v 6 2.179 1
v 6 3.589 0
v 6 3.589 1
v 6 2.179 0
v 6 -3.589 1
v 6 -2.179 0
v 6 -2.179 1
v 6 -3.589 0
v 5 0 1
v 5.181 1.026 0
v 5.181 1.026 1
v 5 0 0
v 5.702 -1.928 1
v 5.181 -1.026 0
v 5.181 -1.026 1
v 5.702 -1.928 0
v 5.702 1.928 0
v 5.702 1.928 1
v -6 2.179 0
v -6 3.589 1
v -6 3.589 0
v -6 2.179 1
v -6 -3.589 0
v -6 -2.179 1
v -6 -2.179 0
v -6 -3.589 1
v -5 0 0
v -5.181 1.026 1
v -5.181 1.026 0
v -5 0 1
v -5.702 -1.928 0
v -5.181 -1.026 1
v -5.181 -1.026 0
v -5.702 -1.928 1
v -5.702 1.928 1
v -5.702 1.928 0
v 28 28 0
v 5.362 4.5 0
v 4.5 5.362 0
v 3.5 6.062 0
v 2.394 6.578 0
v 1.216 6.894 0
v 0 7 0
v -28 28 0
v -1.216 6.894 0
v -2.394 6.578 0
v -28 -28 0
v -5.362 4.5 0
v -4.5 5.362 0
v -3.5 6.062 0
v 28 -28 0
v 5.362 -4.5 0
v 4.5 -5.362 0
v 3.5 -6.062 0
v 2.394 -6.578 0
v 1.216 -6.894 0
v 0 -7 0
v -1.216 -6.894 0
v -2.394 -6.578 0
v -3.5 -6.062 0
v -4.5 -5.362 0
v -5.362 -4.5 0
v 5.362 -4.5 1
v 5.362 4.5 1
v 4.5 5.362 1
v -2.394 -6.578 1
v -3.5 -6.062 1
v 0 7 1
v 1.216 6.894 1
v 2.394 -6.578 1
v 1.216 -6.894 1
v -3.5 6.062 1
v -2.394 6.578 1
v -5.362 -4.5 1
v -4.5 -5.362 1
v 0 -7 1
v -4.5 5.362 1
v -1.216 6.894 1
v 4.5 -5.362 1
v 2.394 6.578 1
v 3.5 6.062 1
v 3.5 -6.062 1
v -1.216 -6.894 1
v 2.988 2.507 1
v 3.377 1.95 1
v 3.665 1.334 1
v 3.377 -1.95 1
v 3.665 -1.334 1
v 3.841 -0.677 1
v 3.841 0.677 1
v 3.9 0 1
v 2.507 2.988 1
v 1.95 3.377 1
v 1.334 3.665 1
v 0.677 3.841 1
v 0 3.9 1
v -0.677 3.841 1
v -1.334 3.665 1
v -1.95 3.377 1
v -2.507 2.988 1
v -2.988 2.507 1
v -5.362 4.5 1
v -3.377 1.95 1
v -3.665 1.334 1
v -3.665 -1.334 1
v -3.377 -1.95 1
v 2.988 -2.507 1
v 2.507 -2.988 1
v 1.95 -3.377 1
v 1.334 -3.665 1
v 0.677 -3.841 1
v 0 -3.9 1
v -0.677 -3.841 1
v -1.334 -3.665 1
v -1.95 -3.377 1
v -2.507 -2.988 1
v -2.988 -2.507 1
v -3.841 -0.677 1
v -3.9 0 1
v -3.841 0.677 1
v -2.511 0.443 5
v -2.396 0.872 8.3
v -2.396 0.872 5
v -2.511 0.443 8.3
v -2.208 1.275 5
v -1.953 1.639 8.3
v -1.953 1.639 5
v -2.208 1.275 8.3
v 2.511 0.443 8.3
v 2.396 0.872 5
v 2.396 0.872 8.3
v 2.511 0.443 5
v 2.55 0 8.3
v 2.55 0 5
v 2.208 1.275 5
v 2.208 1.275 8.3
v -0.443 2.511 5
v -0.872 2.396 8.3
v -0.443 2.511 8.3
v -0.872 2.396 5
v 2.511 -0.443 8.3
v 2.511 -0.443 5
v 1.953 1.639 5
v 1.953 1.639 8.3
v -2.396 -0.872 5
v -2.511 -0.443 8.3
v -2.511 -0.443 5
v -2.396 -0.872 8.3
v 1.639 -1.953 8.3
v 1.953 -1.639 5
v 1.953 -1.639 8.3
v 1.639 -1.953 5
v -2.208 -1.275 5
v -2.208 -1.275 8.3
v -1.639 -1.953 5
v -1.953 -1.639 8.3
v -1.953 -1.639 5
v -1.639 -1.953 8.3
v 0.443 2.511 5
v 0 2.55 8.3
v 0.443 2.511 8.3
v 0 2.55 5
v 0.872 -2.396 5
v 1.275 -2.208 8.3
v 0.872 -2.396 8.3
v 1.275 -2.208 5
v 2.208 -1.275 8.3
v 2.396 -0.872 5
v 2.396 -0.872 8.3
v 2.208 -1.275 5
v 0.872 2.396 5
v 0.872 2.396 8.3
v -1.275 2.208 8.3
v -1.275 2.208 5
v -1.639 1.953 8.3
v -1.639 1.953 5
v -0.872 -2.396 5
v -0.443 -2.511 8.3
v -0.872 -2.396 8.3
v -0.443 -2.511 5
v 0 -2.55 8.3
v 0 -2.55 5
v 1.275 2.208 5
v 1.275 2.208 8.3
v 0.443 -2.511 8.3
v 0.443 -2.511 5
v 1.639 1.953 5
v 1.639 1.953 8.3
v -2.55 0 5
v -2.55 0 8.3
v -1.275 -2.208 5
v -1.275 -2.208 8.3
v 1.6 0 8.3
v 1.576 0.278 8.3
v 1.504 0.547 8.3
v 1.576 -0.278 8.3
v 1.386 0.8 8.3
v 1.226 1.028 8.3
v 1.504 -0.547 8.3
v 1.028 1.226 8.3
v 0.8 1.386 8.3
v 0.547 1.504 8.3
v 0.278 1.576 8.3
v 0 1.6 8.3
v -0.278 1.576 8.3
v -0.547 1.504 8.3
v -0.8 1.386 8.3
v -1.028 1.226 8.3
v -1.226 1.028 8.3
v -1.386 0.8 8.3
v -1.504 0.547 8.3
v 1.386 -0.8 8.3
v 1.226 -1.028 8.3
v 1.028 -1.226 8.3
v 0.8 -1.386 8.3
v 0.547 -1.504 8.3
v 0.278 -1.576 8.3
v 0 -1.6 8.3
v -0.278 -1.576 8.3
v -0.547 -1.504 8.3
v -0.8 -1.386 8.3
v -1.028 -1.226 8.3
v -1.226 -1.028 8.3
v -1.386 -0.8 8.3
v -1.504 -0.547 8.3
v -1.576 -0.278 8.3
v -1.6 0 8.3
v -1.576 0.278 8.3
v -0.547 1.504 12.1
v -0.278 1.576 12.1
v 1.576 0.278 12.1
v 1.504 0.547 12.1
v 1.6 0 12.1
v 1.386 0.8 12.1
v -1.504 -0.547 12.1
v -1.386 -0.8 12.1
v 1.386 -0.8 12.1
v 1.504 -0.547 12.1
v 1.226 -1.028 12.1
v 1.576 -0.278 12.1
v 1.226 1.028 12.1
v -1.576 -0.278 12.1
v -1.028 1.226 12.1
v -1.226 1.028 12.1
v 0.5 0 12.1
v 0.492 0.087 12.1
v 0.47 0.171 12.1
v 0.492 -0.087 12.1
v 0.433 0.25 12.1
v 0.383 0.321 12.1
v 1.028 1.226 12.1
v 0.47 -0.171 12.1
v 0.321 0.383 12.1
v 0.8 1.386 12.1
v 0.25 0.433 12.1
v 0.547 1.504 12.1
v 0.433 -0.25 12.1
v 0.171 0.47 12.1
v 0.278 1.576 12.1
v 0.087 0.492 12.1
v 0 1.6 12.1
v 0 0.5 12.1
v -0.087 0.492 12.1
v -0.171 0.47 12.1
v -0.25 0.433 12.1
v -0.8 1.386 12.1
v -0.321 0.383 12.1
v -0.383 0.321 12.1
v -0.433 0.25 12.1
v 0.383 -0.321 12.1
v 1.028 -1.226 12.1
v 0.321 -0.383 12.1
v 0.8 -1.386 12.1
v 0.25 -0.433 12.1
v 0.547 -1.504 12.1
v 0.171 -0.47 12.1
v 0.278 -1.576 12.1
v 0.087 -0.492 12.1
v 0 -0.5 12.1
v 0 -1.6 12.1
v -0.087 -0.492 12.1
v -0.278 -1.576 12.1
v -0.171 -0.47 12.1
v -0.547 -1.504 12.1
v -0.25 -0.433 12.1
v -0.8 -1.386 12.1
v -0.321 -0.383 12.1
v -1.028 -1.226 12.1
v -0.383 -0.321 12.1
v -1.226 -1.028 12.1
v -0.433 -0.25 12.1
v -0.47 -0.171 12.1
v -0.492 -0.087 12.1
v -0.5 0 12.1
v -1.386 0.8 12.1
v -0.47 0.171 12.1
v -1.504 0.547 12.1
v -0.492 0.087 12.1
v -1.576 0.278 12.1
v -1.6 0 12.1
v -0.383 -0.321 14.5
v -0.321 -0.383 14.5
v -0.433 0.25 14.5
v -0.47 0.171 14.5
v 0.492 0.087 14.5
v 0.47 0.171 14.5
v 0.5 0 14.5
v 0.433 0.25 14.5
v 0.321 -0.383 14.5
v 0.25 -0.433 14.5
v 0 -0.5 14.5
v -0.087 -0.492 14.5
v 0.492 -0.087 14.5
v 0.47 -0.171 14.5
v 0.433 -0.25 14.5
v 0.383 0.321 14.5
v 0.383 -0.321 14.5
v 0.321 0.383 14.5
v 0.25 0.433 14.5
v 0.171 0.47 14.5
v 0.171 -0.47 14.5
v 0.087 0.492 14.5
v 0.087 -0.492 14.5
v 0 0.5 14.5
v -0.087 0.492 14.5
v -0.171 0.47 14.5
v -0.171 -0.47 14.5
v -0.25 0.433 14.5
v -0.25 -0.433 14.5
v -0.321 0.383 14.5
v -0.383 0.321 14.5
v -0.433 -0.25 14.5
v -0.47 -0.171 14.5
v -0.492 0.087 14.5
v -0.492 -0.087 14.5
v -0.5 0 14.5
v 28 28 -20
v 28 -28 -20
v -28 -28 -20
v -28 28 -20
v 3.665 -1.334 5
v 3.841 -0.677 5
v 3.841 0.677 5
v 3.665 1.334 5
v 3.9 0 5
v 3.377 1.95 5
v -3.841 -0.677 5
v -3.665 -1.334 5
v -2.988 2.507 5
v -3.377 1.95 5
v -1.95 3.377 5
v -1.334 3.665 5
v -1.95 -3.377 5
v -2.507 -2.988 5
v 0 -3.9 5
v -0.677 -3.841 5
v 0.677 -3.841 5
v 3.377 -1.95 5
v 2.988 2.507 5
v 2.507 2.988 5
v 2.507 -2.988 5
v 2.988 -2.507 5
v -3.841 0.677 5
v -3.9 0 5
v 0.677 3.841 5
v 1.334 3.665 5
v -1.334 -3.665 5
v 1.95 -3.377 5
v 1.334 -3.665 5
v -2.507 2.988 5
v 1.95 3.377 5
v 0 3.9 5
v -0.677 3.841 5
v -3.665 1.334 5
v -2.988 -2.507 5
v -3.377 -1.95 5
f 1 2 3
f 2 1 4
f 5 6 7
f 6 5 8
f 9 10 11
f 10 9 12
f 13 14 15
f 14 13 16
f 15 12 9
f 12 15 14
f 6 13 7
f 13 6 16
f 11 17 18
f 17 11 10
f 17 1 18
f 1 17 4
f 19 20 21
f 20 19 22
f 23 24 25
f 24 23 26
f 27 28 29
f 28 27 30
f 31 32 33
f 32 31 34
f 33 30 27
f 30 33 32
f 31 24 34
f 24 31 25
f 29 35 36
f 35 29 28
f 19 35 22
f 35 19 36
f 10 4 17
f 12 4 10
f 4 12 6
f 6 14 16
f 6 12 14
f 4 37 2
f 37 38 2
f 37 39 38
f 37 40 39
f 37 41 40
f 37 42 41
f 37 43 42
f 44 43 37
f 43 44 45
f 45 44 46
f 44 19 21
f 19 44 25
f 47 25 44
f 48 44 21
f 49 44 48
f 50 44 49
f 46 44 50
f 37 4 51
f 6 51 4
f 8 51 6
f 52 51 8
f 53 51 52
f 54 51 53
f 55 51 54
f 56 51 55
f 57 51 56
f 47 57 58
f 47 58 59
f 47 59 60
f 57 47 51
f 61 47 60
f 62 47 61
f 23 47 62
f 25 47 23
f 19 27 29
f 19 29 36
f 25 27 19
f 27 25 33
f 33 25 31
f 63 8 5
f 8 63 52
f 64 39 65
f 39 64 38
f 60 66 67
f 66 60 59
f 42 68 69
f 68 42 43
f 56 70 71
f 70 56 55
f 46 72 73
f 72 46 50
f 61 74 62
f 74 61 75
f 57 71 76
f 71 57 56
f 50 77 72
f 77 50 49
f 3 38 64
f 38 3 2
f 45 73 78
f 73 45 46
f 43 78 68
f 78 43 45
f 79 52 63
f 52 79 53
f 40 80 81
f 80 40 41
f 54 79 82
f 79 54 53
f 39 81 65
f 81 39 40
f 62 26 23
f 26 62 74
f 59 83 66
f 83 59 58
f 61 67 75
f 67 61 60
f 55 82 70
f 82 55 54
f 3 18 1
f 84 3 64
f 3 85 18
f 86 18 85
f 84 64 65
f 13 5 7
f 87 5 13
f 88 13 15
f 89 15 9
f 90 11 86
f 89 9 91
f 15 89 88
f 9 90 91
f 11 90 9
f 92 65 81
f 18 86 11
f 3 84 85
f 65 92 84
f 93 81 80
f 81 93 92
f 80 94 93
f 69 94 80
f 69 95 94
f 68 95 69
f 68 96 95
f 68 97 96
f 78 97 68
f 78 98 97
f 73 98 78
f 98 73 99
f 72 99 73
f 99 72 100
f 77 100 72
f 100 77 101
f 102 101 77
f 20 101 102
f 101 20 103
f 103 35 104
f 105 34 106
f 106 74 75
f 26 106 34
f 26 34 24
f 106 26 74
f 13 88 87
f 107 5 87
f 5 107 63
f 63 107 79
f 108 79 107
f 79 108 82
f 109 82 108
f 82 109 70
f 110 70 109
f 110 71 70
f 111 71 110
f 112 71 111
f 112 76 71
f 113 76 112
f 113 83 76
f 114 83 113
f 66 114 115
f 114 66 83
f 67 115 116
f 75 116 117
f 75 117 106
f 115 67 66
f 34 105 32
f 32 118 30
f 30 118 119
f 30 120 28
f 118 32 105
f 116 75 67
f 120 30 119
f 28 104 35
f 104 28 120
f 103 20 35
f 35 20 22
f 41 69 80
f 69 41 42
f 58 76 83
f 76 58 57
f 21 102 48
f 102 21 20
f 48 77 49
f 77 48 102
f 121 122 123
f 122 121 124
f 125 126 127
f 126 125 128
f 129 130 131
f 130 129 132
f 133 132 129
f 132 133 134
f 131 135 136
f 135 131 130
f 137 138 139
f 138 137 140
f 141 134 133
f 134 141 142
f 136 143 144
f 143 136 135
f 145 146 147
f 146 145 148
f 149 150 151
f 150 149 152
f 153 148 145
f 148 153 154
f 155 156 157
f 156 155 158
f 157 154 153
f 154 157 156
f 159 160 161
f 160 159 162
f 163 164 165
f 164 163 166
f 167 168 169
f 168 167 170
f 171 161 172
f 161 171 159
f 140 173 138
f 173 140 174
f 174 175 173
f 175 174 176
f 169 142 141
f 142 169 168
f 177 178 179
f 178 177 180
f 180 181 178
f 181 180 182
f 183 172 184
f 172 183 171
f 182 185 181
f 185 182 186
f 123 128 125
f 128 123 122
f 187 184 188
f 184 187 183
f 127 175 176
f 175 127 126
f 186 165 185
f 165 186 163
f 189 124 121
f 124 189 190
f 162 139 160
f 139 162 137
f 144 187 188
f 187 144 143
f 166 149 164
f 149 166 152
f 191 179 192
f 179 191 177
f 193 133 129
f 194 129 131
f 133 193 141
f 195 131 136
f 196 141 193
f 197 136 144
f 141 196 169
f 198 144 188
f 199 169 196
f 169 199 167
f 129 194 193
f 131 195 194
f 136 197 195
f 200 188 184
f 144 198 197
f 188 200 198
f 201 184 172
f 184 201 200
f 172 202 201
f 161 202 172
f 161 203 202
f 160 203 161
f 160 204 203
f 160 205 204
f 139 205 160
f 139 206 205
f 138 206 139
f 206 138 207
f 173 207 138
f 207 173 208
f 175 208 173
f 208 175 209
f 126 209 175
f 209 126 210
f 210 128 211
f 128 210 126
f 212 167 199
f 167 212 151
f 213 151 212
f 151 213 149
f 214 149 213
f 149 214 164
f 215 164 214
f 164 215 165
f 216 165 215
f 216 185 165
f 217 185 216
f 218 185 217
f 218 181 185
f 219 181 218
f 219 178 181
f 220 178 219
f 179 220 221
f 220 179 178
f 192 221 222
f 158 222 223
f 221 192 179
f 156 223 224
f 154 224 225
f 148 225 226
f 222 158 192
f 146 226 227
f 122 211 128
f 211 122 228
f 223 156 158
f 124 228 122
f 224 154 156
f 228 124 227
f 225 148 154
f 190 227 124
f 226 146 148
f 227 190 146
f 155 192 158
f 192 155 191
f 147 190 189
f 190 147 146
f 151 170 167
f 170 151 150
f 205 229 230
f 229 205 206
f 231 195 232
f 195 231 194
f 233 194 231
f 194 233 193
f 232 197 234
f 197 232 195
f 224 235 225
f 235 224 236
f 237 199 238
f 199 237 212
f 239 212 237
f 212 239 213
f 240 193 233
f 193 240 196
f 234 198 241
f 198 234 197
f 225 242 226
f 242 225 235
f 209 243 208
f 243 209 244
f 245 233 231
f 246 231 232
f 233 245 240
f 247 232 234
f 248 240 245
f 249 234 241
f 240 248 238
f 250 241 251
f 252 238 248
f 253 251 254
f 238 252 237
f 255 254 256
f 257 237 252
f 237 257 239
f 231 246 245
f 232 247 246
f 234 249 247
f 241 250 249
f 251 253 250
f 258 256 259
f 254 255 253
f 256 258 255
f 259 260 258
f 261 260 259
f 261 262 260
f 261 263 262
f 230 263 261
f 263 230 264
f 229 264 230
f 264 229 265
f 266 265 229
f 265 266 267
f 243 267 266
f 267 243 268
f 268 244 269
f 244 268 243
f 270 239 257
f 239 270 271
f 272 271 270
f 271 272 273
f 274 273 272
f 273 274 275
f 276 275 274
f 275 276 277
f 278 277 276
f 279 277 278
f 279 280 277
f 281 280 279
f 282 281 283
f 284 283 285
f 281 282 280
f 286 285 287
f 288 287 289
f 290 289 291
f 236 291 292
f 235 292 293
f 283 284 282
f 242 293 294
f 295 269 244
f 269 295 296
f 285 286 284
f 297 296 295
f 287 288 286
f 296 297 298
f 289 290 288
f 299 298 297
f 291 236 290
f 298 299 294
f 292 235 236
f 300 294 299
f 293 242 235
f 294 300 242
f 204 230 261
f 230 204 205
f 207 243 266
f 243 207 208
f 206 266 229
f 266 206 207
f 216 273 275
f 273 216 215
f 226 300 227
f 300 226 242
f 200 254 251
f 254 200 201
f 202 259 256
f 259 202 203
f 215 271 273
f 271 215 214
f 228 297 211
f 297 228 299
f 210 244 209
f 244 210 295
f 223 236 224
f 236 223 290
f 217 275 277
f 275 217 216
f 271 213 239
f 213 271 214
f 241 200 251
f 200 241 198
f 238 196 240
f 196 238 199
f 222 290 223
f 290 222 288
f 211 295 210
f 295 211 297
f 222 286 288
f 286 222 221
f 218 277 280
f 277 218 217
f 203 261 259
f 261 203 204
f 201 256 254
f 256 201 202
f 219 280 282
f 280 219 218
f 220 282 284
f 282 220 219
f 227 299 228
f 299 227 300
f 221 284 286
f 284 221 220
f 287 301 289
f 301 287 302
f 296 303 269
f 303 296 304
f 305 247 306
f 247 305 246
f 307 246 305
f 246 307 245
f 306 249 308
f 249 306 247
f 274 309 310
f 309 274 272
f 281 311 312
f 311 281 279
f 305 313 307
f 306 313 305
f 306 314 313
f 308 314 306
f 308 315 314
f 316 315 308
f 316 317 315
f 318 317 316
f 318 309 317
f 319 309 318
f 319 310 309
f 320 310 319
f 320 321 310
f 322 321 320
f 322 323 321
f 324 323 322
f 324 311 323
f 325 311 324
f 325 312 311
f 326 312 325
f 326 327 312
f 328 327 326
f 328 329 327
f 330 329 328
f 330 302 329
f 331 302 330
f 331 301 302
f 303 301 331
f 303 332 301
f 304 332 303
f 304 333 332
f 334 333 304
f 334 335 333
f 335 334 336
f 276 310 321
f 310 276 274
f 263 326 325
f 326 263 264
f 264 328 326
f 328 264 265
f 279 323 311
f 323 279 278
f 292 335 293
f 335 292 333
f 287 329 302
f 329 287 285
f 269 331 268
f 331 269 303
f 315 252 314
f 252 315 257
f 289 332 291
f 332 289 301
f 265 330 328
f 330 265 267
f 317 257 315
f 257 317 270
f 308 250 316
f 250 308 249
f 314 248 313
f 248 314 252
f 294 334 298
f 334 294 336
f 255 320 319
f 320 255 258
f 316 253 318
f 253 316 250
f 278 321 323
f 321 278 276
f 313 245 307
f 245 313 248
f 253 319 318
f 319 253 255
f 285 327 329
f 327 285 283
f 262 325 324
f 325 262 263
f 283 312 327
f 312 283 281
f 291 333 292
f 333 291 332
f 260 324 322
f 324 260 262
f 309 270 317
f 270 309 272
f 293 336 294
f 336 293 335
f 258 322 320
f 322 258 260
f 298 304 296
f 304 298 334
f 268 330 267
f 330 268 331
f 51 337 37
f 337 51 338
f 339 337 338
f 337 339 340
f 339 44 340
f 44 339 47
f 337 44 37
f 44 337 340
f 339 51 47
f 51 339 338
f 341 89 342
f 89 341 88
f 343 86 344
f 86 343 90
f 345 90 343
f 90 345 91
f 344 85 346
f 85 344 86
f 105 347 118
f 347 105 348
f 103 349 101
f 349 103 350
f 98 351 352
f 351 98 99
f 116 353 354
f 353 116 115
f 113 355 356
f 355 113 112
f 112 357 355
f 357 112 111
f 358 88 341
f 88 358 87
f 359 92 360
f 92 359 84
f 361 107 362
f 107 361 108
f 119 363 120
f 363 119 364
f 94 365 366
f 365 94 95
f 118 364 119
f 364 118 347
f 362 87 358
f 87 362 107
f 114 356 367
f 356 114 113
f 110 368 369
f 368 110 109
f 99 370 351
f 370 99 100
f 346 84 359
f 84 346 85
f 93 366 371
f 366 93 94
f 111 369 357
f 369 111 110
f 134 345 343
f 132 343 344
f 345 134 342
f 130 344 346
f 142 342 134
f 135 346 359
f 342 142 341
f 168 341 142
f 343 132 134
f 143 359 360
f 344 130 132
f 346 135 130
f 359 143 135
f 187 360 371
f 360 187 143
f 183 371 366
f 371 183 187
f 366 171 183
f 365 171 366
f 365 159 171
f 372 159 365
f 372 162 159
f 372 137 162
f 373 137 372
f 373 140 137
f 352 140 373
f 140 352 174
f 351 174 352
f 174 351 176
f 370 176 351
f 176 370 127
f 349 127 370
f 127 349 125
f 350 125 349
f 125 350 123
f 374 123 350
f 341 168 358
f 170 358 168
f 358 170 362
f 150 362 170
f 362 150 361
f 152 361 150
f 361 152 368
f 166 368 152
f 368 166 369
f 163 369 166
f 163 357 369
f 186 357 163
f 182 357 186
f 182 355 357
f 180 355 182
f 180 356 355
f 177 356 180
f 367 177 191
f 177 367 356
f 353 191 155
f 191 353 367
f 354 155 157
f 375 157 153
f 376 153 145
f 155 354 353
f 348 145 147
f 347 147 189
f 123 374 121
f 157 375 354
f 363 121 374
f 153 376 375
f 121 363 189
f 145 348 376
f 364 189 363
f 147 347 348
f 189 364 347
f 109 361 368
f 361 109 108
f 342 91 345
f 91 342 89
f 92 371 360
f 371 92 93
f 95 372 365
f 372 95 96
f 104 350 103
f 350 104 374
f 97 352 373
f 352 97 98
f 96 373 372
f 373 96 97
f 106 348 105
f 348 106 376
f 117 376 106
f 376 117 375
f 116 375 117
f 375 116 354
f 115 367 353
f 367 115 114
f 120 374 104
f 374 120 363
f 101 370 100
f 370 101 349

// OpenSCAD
module clock_movement() {
    
    // box-shaped main body
    width = 56;
    depth = 56;
    height = 20;
    
    // alignment pattern
    alignment_dm = 14; // diameter of alignment pattern
    alignment_h = 1;    // height of alignment pattern
    alignment_flat = 1; // recess of falttening
    alignment_notch_dm = 6; // diameter of alignment notches
    alignment_notch_fl = 2; // recess of notch flattening
    
    // main body
    color("Gray")
    // method 1 as of in the book
    translate( [-width / 2, -depth / 2 , -height ] )
    cube( [width, depth, height] ); 
    // method 2
//    translate( [0, 0, -height/2] )
//   # cube( [width, depth, height], center = true ); 

    // screw terminal (measured from main body)
    screw_terminal_dm = 7.8;    // screw terminal diameter
    screw_terminal_h = 5;   // screw terminal height
    
    // clock hands
    hour_axle_dm = 5.1; // hour axle diameter
    hour_axle_h = 8.3;  // hour axle height
    
    minute_axle_dm = 3.2; // hour axle diameter
    minute_axle_h = 12.1;  // hour axle height
    
    second_axle_dm = 1; // hour axle diameter
    second_axle_h = 14.5;  // hour axle height
    
    // alignment pattern
     difference() {
        
        color("DarkBlue")
        cylinder( d = alignment_dm, h = alignment_h, $fn = 36);
        
        color("Gray")
        for ( i = [0:1] )
        mirror( [i, 0, 0] )
        union() {
            translate([ alignment_dm / 2 - alignment_flat, -(alignment_dm + 2) / 2, -1 ])
            cube([alignment_flat + 1, alignment_dm + 2, alignment_h + 2 ]);
            
            translate([ alignment_dm / 2 - alignment_notch_fl + alignment_notch_dm / 2, 0, -1 ])
            cylinder( d = alignment_notch_dm, h = alignment_h +2, $fn = 18);
        }
    }
    
    // screw terminal
    color("Gold")
    cylinder( d = screw_terminal_dm, h = screw_terminal_h, $fn = 36);
    
    // axles
    color("Black") {
        cylinder( d = hour_axle_dm, h = hour_axle_h, $fn = 36);
        cylinder( d = minute_axle_dm, h = minute_axle_h, $fn = 36);
        cylinder( d = second_axle_dm, h = second_axle_h, $fn = 36);
    }
    
    }
    
clock_movement();
